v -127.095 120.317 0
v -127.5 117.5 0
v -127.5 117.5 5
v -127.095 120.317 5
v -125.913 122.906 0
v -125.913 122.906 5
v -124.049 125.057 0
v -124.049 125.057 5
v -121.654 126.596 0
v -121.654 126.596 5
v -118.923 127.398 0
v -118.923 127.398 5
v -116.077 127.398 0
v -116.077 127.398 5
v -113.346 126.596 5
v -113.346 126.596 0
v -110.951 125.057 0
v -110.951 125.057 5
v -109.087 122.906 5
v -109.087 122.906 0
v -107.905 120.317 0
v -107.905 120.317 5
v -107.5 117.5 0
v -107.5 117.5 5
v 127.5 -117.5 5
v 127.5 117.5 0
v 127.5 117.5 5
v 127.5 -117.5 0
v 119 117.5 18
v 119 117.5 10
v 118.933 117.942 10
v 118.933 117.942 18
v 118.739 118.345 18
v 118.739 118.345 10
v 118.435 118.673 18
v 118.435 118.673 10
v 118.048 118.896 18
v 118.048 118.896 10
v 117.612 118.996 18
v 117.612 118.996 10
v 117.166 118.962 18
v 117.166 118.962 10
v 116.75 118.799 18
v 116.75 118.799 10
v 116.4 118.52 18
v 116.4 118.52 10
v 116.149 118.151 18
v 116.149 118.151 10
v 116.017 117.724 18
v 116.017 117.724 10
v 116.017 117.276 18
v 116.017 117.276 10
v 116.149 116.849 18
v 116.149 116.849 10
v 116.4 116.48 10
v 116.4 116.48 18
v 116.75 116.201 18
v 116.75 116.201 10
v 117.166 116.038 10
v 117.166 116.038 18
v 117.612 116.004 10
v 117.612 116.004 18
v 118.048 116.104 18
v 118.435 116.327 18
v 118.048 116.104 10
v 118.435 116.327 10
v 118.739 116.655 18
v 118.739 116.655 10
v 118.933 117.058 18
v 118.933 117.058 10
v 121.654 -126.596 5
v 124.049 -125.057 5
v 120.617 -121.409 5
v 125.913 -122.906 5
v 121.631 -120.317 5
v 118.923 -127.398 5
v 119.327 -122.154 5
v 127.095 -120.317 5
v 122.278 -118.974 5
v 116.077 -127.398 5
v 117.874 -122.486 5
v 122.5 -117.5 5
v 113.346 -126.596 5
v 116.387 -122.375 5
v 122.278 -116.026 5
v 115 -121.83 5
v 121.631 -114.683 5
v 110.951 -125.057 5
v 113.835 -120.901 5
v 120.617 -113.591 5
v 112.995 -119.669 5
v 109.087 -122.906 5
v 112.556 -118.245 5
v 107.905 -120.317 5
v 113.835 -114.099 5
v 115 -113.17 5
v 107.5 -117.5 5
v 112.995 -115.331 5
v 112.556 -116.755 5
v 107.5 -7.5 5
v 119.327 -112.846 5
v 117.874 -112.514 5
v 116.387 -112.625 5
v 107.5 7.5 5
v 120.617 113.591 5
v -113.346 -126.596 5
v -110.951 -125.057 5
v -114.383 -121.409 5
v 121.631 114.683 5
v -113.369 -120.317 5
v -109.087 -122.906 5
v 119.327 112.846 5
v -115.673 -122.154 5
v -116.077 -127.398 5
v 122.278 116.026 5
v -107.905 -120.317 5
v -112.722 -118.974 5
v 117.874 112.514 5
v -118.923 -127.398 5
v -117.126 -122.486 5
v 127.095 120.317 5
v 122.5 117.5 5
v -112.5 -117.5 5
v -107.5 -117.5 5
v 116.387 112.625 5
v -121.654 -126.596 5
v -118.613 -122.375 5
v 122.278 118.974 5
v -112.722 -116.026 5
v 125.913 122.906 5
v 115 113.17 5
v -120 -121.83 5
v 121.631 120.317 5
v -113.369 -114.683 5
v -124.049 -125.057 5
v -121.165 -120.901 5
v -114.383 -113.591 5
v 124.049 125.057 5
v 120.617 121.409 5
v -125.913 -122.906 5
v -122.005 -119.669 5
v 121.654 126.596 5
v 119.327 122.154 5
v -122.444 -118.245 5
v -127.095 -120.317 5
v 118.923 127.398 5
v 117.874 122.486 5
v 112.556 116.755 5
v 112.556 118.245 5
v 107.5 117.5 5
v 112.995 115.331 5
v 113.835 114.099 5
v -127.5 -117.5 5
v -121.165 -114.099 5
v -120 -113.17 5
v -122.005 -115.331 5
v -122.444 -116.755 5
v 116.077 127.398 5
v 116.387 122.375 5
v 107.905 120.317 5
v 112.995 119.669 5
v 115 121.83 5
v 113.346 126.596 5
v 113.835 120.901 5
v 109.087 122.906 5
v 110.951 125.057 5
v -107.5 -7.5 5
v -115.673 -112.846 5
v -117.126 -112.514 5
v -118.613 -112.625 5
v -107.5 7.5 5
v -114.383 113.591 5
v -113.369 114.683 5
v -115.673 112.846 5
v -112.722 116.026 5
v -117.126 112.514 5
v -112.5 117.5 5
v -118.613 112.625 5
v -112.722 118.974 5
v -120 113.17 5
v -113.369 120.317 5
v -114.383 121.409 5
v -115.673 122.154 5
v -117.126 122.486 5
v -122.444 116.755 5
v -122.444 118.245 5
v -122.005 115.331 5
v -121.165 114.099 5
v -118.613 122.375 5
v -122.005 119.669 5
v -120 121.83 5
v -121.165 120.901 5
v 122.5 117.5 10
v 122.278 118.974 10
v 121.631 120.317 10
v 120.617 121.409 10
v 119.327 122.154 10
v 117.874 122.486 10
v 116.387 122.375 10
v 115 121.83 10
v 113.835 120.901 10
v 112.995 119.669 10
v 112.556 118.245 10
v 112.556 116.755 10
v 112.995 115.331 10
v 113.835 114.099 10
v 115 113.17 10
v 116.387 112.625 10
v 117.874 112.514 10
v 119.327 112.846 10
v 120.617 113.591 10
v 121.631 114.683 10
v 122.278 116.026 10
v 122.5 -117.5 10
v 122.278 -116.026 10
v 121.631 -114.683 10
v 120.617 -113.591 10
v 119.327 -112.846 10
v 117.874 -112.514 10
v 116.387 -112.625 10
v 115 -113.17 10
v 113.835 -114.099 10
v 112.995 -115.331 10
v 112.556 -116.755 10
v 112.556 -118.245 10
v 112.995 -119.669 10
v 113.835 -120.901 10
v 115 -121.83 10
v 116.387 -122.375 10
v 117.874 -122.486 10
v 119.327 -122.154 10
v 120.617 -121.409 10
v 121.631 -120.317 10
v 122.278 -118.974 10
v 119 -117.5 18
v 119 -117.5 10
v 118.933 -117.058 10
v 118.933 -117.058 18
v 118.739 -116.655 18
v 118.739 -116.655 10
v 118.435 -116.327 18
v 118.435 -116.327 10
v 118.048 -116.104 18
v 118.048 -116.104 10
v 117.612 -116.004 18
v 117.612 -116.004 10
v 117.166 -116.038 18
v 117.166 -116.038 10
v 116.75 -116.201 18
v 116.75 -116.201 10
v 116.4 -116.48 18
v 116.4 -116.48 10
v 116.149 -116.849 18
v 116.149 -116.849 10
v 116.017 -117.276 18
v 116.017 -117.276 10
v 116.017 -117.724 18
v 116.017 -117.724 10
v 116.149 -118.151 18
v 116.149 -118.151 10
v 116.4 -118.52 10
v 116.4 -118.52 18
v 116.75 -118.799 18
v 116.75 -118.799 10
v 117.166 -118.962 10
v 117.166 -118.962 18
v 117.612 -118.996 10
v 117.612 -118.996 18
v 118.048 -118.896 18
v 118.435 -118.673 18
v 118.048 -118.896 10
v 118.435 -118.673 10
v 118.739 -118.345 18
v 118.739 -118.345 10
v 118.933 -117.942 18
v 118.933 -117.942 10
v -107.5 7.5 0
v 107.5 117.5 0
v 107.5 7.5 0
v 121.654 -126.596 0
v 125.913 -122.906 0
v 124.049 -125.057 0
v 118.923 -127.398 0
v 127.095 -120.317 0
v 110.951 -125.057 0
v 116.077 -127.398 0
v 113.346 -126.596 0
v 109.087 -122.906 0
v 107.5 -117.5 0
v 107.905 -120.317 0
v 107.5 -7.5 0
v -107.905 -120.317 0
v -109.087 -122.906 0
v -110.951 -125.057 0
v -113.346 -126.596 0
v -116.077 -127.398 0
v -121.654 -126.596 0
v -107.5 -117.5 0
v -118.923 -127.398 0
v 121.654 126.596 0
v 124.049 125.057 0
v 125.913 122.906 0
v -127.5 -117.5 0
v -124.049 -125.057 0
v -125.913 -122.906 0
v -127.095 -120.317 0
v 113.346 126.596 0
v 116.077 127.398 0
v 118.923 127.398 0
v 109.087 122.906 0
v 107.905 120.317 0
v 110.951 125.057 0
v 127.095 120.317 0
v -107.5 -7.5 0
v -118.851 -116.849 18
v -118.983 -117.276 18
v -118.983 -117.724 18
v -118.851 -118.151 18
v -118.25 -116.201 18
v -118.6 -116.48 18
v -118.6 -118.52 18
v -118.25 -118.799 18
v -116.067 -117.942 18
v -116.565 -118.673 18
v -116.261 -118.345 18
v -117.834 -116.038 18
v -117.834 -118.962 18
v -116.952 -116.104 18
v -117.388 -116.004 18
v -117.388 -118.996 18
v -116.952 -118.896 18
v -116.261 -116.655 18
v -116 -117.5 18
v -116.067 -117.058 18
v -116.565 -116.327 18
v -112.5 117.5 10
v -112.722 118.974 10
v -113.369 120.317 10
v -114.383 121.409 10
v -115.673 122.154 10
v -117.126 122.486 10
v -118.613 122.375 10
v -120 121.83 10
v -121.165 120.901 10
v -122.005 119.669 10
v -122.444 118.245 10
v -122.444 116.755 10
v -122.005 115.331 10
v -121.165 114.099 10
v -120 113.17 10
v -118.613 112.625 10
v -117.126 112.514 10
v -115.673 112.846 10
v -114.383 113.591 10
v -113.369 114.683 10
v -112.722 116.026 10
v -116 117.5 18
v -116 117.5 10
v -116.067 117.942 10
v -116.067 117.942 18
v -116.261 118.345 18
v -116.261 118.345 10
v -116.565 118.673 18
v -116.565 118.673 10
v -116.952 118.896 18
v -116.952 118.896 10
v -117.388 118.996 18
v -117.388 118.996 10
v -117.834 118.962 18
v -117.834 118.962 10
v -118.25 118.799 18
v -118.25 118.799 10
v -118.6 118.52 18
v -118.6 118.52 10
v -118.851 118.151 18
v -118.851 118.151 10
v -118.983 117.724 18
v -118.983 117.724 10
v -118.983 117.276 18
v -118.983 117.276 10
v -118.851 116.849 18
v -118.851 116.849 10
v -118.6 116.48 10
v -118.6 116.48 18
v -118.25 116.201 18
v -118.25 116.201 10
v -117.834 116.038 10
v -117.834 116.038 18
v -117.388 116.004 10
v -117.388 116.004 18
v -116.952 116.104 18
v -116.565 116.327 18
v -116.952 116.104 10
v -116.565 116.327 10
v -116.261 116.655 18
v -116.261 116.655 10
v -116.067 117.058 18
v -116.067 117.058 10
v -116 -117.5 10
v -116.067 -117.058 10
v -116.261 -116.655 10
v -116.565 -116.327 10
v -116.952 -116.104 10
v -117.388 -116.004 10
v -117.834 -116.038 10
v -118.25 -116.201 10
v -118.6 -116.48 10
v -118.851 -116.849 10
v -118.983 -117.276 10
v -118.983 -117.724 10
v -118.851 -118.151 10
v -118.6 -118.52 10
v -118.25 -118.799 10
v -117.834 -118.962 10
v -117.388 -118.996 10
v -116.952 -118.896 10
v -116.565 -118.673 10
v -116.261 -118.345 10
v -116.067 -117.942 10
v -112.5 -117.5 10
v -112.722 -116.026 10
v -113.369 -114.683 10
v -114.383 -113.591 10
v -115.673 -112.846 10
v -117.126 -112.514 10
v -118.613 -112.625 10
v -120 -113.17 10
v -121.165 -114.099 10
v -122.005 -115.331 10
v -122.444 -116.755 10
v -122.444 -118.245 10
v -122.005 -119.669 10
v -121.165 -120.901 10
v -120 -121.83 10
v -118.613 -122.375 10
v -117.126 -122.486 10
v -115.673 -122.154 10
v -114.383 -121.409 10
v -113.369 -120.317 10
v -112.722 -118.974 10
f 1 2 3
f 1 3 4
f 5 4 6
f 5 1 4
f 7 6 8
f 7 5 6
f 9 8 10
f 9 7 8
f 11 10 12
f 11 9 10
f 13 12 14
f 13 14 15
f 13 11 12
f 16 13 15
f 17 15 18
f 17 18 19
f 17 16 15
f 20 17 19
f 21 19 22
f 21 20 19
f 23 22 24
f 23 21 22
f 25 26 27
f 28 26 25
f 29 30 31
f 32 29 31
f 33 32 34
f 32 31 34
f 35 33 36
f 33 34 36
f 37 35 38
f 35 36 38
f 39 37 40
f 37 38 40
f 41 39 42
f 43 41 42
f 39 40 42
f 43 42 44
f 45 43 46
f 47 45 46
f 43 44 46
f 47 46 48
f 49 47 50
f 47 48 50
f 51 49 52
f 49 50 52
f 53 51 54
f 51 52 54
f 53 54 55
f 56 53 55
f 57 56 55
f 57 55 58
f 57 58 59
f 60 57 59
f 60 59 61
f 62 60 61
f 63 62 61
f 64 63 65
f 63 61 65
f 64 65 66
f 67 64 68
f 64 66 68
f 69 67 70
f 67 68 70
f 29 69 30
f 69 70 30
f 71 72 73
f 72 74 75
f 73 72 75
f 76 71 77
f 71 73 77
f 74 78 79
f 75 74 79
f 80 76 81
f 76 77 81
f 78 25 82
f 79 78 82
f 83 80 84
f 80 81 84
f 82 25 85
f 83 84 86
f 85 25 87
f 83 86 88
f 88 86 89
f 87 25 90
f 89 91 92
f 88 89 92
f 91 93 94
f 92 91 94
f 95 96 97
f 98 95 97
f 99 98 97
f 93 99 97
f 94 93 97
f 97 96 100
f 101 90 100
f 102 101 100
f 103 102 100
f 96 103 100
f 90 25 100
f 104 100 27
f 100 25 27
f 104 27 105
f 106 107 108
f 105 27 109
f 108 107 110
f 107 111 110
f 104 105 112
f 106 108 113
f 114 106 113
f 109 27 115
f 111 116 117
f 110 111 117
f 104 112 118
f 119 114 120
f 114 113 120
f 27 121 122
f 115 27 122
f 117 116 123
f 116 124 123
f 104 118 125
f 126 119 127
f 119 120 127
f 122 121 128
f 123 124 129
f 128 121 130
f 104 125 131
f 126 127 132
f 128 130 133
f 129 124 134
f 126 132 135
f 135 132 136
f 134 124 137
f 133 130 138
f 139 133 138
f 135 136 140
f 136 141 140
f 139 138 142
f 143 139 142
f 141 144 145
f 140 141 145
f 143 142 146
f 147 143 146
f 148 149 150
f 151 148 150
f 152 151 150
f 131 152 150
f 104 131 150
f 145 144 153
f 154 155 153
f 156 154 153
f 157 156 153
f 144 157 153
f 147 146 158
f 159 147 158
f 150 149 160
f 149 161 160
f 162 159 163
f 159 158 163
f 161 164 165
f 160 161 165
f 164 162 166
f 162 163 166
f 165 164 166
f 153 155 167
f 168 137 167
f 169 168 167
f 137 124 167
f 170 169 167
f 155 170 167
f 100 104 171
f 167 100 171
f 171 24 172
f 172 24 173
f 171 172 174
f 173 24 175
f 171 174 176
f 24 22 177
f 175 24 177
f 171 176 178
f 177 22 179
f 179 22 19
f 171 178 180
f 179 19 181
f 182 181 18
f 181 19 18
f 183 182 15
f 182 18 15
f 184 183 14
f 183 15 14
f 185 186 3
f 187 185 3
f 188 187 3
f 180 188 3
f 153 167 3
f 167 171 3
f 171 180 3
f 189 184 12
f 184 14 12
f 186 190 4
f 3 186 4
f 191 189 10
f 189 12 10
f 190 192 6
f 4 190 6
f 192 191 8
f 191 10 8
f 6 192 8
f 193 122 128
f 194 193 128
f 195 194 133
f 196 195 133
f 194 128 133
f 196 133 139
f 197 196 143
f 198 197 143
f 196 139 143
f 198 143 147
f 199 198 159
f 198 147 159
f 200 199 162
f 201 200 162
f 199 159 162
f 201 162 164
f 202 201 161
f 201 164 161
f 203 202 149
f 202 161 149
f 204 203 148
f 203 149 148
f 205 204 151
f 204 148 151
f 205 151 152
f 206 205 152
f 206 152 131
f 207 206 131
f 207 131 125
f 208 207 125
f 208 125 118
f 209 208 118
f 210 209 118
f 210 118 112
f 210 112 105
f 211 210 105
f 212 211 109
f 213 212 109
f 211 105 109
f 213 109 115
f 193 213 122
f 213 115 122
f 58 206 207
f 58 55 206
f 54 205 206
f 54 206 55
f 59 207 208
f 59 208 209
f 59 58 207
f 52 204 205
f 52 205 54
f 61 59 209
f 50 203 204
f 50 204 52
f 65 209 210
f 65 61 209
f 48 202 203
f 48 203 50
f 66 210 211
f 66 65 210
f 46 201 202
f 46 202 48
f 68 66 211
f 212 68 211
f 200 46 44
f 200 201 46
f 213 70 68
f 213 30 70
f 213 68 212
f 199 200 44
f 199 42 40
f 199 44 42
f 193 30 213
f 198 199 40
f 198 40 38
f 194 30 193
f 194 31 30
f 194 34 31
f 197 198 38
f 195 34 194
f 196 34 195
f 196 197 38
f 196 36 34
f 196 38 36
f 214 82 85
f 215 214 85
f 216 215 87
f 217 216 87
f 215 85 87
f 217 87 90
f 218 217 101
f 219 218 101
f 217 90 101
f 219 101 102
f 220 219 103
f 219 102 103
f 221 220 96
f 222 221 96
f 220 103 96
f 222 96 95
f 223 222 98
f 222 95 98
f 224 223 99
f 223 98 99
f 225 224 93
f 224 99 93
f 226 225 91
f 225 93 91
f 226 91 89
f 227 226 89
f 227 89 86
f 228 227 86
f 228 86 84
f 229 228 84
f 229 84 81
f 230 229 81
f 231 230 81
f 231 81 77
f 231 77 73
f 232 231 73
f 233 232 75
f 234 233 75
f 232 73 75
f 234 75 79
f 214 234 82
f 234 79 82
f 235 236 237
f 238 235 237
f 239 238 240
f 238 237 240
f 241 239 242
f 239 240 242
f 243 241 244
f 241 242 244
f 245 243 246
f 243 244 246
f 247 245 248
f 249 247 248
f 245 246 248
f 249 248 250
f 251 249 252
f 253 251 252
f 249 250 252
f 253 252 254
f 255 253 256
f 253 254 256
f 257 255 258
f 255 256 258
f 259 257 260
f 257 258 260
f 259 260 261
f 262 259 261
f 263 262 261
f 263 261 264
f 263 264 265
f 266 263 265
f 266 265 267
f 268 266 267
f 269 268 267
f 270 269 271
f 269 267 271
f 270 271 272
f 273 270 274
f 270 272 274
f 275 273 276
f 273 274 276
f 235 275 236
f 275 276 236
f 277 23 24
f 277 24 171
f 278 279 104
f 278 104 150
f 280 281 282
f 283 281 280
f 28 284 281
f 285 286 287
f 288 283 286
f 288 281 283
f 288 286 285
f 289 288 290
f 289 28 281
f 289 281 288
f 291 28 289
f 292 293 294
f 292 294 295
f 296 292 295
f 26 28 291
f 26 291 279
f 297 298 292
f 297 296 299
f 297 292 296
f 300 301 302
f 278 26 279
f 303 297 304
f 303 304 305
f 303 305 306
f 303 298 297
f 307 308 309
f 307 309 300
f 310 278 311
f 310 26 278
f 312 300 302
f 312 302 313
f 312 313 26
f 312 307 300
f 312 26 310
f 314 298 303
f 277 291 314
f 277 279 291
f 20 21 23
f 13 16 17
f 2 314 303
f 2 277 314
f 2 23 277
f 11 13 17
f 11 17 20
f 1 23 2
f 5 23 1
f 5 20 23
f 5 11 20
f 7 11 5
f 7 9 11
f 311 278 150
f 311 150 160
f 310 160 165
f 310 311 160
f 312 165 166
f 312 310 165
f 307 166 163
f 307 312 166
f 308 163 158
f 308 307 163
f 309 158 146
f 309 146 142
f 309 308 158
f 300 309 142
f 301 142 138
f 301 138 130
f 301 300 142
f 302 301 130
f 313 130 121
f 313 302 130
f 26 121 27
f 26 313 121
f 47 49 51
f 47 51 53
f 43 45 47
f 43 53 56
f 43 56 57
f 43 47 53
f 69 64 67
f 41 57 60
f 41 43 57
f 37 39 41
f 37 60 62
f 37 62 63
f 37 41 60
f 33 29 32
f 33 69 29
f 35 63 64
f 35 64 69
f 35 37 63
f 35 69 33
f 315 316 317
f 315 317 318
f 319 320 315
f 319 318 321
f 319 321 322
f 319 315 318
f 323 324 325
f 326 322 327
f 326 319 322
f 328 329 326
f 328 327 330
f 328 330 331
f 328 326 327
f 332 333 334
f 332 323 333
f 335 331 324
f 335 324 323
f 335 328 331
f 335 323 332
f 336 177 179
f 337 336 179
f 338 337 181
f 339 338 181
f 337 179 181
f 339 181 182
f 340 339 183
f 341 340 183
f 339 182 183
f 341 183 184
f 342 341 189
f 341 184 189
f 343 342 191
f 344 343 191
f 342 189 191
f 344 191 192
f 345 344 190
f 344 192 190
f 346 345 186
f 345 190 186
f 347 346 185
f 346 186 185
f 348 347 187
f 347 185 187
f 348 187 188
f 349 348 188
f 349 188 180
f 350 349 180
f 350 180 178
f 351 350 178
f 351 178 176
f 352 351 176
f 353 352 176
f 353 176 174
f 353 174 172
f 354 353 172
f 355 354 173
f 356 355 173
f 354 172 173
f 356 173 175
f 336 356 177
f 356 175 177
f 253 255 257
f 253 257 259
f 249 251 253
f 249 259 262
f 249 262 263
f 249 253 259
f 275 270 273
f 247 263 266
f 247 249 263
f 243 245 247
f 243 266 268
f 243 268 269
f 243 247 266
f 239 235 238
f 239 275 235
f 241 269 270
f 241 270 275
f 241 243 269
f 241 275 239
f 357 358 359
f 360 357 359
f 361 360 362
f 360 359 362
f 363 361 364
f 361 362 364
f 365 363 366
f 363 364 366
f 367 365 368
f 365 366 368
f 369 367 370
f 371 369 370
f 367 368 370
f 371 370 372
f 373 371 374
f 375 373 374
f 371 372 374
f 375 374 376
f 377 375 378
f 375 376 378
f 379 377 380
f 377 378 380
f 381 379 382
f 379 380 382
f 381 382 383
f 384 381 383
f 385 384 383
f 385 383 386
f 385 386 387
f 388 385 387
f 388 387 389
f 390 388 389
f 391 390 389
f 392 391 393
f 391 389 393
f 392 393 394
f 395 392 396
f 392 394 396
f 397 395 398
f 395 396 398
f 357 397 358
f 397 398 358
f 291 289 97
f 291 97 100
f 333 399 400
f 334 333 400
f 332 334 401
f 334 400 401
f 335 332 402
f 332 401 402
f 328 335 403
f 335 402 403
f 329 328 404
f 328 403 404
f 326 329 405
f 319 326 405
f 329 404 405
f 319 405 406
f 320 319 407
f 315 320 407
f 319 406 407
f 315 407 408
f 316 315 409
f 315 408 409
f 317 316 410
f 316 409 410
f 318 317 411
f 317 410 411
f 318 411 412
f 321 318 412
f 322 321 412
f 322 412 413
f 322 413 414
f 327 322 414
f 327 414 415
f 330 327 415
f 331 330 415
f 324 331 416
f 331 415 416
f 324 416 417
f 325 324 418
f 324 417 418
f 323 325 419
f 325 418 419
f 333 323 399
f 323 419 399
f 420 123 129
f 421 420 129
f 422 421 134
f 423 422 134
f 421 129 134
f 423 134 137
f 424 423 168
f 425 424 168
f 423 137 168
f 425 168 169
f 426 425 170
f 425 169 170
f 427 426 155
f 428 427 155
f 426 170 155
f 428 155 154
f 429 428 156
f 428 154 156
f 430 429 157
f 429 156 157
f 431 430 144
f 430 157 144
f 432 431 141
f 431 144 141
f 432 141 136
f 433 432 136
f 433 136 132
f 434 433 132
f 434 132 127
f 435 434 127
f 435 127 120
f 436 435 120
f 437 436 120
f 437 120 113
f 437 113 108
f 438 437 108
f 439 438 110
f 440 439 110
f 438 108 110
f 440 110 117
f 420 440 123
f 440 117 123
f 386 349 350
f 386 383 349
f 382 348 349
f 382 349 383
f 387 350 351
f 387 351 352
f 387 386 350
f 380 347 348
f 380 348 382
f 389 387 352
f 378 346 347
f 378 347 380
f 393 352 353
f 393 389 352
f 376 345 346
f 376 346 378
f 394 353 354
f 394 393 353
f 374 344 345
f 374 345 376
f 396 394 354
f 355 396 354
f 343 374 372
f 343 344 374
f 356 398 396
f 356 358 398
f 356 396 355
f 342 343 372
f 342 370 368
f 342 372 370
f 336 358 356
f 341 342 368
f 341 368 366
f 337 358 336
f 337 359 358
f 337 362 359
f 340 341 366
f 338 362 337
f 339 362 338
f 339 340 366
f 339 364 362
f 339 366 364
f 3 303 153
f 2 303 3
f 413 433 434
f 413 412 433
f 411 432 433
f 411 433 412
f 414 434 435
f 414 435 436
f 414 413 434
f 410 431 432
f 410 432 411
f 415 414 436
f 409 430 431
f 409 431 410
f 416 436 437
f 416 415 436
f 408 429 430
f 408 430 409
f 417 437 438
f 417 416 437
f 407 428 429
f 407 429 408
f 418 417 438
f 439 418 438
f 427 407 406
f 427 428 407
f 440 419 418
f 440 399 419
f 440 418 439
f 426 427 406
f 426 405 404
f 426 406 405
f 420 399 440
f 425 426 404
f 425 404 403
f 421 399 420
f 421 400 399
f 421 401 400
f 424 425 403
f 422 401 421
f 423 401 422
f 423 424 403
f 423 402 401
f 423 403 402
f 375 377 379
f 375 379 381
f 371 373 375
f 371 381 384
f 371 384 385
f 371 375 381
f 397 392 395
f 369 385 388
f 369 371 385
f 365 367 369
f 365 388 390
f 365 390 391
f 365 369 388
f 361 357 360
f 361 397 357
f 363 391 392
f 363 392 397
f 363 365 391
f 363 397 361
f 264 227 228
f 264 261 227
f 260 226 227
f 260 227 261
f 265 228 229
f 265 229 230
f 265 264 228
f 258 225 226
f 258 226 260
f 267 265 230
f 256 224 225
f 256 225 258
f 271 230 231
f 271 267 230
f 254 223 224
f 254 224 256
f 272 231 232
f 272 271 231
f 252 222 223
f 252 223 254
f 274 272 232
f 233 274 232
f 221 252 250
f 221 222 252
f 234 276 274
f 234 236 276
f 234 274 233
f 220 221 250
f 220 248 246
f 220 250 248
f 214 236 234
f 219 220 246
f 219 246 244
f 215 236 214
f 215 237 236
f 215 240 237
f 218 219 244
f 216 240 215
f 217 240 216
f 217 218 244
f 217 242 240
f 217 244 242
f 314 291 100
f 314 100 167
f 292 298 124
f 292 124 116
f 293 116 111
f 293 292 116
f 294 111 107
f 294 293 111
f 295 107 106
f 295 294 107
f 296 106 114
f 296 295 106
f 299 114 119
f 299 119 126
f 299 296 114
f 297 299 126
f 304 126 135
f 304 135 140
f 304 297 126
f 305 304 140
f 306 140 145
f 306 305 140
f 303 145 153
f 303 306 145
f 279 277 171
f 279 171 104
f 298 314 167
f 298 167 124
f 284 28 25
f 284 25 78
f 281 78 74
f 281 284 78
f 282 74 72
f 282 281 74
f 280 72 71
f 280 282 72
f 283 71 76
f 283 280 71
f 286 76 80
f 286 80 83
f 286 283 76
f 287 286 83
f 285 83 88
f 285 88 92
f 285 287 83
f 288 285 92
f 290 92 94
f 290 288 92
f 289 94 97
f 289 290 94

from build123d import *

# Parameters (mm, degrees)
BOSS_EXTRUDE1_DEPTH = 5
SKETCH3_R           = 5
BOSS_EXTRUDE2_DEPTH = 5
SKETCH4_R           = 1.5
BOSS_EXTRUDE3_DEPTH = 8


with BuildPart() as part:
    # Sketch1 → Boss-Extrude1 (new body)
    with BuildSketch(Plane.XY):
        with BuildLine():
            Line((-107.5, 7.5), (107.5, 7.5))
            Line((107.5, 7.5), (107.5, 117.5))
            ThreePointArc((107.5, 117.5), (117.5, 127.5), (127.5, 117.5))
            Line((127.5, 117.5), (127.5, -117.5))
            ThreePointArc((127.5, -117.5), (117.5, -127.5), (107.5, -117.5))
            Line((107.5, -117.5), (107.5, -7.5))
            Line((107.5, -7.5), (-107.5, -7.5))
            Line((-107.5, -7.5), (-107.5, -117.5))
            ThreePointArc((-107.5, -117.5), (-117.5, -127.5), (-127.5, -117.5))
            Line((-127.5, -117.5), (-127.5, 117.5))
            ThreePointArc((-127.5, 117.5), (-117.5, 127.5), (-107.5, 117.5))
            Line((-107.5, 117.5), (-107.5, 7.5))
        make_face()
    extrude(amount=BOSS_EXTRUDE1_DEPTH)

    # Sketch3 → Boss-Extrude2 (add)
    with BuildSketch(Plane.XY.offset(5)):
        with Locations((117.5, -117.5)):
            Circle(SKETCH3_R)
        with Locations((117.5, 117.5)):
            Circle(SKETCH3_R)
        with Locations((-117.5, 117.5)):
            Circle(SKETCH3_R)
        with Locations((-117.5, -117.5)):
            Circle(SKETCH3_R)
    extrude(amount=BOSS_EXTRUDE2_DEPTH)

    # Sketch4 → Boss-Extrude3 (add)
    with BuildSketch(Plane.XY.offset(10)):
        with Locations((-117.5, 117.5)):
            Circle(SKETCH4_R)
        with Locations((-117.5, -117.5)):
            Circle(SKETCH4_R)
        with Locations((117.5, -117.5)):
            Circle(SKETCH4_R)
        with Locations((117.5, 117.5)):
            Circle(SKETCH4_R)
    extrude(amount=BOSS_EXTRUDE3_DEPTH)


solid = part.part
